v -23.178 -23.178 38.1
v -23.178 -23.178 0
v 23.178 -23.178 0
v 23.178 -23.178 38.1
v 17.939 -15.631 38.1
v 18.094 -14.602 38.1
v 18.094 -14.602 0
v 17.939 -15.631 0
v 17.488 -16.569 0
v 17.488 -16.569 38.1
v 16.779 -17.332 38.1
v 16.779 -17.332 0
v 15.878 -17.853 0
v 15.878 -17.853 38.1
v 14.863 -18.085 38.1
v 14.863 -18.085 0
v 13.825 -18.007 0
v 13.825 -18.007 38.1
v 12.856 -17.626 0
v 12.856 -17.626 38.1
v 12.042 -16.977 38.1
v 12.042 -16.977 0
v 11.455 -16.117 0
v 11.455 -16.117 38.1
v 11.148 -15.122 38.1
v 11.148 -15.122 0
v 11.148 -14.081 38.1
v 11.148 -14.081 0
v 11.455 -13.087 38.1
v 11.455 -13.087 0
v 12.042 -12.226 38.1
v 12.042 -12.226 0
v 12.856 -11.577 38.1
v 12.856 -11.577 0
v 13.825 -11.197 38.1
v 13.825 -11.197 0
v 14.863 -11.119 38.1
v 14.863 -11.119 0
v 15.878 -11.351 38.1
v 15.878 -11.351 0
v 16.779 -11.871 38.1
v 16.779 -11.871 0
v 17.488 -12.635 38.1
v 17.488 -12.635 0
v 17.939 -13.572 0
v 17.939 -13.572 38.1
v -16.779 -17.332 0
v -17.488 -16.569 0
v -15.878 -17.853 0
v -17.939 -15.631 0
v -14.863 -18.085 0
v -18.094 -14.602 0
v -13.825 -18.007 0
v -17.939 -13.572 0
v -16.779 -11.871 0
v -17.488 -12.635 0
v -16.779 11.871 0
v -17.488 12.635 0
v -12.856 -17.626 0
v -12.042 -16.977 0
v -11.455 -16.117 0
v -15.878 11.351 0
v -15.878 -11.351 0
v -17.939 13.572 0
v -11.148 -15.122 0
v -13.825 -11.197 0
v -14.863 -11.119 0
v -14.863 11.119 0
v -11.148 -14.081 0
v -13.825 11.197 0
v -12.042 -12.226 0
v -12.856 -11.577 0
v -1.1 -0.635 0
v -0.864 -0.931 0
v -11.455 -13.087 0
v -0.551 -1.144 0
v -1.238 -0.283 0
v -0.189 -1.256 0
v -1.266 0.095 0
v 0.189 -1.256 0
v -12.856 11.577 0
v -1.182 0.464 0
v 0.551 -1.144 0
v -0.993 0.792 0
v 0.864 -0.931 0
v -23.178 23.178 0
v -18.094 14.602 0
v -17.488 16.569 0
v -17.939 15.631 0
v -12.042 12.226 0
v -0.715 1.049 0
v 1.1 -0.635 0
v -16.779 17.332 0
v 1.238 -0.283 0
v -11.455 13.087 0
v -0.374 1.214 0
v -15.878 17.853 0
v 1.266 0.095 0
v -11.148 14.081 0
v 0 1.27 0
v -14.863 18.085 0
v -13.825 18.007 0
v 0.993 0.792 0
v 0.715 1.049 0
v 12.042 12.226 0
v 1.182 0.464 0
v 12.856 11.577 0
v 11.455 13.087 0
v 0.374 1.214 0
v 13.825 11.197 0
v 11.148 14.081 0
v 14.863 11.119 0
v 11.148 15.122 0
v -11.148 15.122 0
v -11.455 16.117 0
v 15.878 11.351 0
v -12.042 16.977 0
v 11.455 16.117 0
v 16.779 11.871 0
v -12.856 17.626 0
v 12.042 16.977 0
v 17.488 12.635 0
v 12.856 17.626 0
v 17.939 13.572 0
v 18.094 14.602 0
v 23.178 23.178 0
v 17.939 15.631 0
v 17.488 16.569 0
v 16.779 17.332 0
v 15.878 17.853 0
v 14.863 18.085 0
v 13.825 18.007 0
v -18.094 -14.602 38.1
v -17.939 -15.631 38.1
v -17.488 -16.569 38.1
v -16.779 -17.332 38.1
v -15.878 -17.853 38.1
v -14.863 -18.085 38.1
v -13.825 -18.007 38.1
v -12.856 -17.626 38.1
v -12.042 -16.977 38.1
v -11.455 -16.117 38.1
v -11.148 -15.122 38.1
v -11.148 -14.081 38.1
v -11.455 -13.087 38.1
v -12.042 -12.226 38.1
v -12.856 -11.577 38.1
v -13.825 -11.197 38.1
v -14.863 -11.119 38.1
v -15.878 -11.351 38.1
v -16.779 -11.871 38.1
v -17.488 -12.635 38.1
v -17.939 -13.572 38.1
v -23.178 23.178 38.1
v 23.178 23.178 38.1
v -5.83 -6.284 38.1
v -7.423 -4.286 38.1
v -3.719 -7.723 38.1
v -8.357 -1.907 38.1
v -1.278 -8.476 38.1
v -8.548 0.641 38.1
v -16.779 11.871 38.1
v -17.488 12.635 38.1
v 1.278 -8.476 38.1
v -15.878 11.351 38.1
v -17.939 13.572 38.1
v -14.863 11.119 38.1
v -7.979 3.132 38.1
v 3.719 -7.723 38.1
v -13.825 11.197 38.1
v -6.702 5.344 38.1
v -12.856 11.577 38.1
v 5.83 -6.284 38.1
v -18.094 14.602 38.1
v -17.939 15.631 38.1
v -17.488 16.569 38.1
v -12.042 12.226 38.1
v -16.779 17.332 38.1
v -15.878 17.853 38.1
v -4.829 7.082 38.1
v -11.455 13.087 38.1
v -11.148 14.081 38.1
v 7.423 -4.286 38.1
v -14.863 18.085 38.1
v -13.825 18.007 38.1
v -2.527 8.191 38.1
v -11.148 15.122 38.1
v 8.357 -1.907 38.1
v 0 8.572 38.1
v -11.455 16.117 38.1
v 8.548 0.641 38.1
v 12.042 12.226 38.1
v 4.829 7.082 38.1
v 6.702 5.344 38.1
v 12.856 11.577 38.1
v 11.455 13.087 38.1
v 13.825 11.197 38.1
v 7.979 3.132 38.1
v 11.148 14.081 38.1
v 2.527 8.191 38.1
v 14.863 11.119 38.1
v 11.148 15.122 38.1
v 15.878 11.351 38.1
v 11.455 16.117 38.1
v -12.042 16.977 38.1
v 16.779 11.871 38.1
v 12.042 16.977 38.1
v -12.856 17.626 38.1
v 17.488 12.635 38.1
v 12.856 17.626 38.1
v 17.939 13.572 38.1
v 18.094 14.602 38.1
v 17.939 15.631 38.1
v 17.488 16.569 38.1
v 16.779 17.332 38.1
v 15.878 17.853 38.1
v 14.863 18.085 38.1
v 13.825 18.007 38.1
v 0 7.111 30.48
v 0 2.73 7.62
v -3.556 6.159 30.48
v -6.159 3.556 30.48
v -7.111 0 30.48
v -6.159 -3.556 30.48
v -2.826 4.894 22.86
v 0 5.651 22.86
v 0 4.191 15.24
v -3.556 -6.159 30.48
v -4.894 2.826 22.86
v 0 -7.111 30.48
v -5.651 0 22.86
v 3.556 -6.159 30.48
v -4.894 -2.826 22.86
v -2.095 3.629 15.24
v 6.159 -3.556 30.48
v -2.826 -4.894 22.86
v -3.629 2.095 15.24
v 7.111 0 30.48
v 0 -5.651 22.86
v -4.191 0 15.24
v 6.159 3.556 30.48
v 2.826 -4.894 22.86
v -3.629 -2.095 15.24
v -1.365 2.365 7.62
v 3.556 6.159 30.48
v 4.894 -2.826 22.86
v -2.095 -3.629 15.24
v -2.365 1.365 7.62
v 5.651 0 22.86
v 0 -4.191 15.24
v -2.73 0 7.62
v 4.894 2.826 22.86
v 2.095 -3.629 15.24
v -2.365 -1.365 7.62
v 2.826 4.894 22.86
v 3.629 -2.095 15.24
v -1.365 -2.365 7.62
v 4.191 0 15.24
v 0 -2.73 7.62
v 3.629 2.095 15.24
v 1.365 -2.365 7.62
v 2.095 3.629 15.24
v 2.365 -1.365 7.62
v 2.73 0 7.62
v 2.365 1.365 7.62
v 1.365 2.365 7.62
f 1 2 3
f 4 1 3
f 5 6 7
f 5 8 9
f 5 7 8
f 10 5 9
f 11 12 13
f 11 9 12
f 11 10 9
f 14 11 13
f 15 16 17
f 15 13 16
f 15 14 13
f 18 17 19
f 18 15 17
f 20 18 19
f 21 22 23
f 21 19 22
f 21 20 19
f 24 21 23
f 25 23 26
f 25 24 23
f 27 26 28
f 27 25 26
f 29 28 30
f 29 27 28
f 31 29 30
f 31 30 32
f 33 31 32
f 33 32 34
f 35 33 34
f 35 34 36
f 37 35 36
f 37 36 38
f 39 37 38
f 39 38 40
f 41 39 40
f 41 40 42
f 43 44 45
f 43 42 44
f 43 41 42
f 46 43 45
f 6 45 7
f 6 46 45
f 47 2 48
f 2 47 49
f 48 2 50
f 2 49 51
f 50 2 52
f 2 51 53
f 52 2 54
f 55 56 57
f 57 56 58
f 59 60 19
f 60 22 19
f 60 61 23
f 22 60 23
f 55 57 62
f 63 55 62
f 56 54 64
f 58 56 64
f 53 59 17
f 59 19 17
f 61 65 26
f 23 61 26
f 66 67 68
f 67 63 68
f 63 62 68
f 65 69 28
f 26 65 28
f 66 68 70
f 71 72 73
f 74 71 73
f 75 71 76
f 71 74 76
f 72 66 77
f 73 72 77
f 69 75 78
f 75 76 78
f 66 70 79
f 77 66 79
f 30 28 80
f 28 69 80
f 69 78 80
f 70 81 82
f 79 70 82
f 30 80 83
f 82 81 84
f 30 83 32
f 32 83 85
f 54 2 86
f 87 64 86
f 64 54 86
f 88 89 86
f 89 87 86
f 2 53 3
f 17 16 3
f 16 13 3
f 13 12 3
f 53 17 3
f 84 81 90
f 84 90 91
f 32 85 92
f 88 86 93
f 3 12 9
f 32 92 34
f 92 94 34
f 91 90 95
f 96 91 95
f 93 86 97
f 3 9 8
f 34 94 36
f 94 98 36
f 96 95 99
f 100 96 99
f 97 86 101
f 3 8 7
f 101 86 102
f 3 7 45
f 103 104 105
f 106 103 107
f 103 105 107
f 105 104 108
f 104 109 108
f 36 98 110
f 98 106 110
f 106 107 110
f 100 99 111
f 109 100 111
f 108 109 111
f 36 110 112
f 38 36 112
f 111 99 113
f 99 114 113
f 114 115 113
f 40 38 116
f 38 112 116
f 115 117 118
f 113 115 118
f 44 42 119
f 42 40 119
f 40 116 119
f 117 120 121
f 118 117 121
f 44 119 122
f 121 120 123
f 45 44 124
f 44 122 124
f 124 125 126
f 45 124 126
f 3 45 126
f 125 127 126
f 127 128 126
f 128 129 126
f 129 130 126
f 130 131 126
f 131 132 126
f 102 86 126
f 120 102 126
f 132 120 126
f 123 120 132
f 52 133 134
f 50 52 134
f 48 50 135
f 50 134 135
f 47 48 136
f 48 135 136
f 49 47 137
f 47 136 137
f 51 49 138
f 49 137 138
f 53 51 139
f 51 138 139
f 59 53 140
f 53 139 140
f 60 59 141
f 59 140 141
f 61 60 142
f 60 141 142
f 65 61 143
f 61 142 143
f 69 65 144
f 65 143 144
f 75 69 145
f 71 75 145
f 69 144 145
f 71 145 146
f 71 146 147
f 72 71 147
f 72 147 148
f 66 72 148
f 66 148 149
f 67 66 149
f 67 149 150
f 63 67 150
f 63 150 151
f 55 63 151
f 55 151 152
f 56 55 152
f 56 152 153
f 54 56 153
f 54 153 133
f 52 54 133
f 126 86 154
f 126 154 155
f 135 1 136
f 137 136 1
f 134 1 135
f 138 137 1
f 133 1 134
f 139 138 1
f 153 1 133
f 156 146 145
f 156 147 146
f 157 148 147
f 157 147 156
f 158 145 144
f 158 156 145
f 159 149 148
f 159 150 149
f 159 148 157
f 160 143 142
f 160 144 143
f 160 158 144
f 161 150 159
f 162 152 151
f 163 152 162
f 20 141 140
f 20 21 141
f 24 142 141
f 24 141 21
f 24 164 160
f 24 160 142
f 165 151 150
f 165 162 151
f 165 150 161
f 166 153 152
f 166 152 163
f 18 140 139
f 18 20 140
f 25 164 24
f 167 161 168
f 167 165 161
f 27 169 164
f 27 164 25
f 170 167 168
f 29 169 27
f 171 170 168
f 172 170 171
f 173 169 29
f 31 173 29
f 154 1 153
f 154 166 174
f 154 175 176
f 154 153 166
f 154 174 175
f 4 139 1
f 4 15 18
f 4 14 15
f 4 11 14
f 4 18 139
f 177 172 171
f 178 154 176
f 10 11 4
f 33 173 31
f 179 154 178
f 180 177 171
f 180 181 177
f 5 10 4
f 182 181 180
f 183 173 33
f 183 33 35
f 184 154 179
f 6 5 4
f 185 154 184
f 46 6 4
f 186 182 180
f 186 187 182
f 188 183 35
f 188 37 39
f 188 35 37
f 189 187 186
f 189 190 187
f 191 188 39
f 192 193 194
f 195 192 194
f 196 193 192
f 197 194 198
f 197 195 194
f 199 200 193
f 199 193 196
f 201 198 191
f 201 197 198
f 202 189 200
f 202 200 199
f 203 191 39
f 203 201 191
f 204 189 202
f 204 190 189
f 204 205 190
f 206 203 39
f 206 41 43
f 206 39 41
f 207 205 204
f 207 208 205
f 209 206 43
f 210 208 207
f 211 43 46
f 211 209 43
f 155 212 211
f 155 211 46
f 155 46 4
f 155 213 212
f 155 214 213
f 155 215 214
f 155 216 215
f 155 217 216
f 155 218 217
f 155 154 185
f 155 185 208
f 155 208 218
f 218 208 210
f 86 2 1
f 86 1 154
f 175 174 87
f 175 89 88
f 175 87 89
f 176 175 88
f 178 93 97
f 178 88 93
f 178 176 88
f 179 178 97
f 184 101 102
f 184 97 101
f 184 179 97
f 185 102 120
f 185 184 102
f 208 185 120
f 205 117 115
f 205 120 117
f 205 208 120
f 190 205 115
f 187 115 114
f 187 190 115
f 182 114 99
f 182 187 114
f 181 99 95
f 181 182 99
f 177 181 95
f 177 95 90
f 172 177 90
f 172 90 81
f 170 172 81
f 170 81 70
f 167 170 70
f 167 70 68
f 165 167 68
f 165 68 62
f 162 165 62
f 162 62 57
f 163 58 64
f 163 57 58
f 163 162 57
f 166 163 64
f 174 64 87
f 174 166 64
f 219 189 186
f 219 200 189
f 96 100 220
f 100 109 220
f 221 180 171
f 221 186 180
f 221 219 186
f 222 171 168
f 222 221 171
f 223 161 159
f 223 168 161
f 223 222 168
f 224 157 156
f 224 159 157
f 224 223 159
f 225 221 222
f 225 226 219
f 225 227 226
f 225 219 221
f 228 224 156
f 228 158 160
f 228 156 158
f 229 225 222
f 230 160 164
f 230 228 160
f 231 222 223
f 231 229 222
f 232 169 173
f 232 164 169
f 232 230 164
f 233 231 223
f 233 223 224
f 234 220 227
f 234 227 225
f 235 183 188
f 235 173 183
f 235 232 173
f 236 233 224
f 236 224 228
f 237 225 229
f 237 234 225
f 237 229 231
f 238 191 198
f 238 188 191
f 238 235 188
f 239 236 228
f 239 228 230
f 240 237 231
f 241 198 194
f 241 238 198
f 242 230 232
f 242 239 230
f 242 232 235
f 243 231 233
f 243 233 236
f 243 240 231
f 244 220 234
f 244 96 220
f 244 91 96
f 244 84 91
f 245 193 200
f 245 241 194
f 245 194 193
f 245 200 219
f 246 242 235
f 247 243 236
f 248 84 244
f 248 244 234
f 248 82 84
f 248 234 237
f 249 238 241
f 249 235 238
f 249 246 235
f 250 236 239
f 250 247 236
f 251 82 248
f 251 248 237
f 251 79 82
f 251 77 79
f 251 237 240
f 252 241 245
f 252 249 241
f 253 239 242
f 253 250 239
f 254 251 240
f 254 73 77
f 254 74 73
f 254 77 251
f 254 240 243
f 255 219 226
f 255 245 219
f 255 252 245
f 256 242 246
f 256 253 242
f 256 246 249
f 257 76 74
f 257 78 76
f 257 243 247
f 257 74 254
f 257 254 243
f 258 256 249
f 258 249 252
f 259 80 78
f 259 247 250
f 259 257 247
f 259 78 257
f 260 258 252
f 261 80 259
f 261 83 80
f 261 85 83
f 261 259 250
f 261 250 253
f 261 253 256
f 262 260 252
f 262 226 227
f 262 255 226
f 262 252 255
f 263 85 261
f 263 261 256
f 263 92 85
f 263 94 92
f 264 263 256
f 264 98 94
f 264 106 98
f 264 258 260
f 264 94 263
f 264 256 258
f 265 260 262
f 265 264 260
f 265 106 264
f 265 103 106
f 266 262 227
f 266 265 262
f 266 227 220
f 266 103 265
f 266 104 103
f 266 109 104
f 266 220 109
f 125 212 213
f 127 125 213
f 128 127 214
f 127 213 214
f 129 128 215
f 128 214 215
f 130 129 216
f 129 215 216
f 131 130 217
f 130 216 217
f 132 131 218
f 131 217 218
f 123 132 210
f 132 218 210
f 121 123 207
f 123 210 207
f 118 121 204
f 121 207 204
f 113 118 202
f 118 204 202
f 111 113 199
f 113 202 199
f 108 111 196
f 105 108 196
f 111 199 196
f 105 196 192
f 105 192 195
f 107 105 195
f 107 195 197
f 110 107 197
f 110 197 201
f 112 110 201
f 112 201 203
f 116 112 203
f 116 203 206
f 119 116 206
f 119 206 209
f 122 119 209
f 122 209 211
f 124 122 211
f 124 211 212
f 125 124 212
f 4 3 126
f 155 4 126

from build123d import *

# Parameters (mm, degrees)
SKETCH1_W               = 46.355
SKETCH1_H               = 46.355
BOSS_EXTRUDE1_DEPTH     = 63.5
SKETCH2_R               = 1.27
CUT_EXTRUDE1_DEPTH      = 64.5
SKETCH4_R               = 3.4925
CUT_EXTRUDE3_DEPTH      = 64.5
MIRROR2_COPY_1_SKETCH_R = 3.4925
MIRROR2_COPY_1_DEPTH    = 64.5
SKETCH6_W               = 50.639915967
SKETCH6_H               = 51.332427637
CUT_EXTRUDE4_DEPTH      = 25.4


with BuildPart() as part:
    # Sketch1 → Boss-Extrude1 (new body)
    with BuildSketch(Plane.XY):
        Rectangle(SKETCH1_W, SKETCH1_H)
    extrude(amount=BOSS_EXTRUDE1_DEPTH)

    # Sketch2 → Cut-Extrude1 (cut, through all)
    with BuildSketch(Plane.XY.offset(63.5)):
        Circle(SKETCH2_R)
    extrude(amount=-CUT_EXTRUDE1_DEPTH, mode=Mode.SUBTRACT)

    # Sketch4 → Cut-Extrude3 (cut, through all)
    with BuildSketch(Plane.XY.offset(63.5)):
        with Locations((14.601896453, 14.601896453)):
            Circle(SKETCH4_R)
    cut_extrude3 = extrude(amount=-CUT_EXTRUDE3_DEPTH, mode=Mode.SUBTRACT)

    # Mirror1: Cut-Extrude3 across plane
    add(cut_extrude3.mirror(Plane.ZX), mode=Mode.SUBTRACT)

    # Mirror2: Cut-Extrude3 across plane
    add(cut_extrude3.mirror(Plane(origin=(0, 0, 0), x_dir=(0, 0, 1), z_dir=(1, 0, 0))), mode=Mode.SUBTRACT)

    # Mirror2 copy 1 sketch → Mirror2 copy 1 (cut, through all)
    with BuildSketch(Plane(origin=(0, 0, 63.5), x_dir=(-1, 0, 0), z_dir=(0, 0, 1))):
        with Locations((14.601896453, 14.601896453)):
            Circle(MIRROR2_COPY_1_SKETCH_R)
    extrude(amount=-MIRROR2_COPY_1_DEPTH, mode=Mode.SUBTRACT)

    # Sketch5 → Cut-Revolve1 (revolve, cut)
    with BuildSketch(Plane(origin=(0, 0, 0), x_dir=(0, 0, -1), z_dir=(1, 0, 0))):
        Polygon((-63.5, 9.713622118), (-44.057941111, 9.713622118), (0, 1.27), (0, 0), (-63.5, 0), align=None)
    revolve(axis=Axis((0, 0, 0), (0, 0, 1)), mode=Mode.SUBTRACT)

    # Sketch6 → Cut-Extrude4 (cut)
    with BuildSketch(Plane.XY.offset(63.5)):
        with Locations((0.281332866, -0.281332866)):
            Rectangle(SKETCH6_W, SKETCH6_H)
    extrude(amount=-CUT_EXTRUDE4_DEPTH, mode=Mode.SUBTRACT)


solid = part.part
